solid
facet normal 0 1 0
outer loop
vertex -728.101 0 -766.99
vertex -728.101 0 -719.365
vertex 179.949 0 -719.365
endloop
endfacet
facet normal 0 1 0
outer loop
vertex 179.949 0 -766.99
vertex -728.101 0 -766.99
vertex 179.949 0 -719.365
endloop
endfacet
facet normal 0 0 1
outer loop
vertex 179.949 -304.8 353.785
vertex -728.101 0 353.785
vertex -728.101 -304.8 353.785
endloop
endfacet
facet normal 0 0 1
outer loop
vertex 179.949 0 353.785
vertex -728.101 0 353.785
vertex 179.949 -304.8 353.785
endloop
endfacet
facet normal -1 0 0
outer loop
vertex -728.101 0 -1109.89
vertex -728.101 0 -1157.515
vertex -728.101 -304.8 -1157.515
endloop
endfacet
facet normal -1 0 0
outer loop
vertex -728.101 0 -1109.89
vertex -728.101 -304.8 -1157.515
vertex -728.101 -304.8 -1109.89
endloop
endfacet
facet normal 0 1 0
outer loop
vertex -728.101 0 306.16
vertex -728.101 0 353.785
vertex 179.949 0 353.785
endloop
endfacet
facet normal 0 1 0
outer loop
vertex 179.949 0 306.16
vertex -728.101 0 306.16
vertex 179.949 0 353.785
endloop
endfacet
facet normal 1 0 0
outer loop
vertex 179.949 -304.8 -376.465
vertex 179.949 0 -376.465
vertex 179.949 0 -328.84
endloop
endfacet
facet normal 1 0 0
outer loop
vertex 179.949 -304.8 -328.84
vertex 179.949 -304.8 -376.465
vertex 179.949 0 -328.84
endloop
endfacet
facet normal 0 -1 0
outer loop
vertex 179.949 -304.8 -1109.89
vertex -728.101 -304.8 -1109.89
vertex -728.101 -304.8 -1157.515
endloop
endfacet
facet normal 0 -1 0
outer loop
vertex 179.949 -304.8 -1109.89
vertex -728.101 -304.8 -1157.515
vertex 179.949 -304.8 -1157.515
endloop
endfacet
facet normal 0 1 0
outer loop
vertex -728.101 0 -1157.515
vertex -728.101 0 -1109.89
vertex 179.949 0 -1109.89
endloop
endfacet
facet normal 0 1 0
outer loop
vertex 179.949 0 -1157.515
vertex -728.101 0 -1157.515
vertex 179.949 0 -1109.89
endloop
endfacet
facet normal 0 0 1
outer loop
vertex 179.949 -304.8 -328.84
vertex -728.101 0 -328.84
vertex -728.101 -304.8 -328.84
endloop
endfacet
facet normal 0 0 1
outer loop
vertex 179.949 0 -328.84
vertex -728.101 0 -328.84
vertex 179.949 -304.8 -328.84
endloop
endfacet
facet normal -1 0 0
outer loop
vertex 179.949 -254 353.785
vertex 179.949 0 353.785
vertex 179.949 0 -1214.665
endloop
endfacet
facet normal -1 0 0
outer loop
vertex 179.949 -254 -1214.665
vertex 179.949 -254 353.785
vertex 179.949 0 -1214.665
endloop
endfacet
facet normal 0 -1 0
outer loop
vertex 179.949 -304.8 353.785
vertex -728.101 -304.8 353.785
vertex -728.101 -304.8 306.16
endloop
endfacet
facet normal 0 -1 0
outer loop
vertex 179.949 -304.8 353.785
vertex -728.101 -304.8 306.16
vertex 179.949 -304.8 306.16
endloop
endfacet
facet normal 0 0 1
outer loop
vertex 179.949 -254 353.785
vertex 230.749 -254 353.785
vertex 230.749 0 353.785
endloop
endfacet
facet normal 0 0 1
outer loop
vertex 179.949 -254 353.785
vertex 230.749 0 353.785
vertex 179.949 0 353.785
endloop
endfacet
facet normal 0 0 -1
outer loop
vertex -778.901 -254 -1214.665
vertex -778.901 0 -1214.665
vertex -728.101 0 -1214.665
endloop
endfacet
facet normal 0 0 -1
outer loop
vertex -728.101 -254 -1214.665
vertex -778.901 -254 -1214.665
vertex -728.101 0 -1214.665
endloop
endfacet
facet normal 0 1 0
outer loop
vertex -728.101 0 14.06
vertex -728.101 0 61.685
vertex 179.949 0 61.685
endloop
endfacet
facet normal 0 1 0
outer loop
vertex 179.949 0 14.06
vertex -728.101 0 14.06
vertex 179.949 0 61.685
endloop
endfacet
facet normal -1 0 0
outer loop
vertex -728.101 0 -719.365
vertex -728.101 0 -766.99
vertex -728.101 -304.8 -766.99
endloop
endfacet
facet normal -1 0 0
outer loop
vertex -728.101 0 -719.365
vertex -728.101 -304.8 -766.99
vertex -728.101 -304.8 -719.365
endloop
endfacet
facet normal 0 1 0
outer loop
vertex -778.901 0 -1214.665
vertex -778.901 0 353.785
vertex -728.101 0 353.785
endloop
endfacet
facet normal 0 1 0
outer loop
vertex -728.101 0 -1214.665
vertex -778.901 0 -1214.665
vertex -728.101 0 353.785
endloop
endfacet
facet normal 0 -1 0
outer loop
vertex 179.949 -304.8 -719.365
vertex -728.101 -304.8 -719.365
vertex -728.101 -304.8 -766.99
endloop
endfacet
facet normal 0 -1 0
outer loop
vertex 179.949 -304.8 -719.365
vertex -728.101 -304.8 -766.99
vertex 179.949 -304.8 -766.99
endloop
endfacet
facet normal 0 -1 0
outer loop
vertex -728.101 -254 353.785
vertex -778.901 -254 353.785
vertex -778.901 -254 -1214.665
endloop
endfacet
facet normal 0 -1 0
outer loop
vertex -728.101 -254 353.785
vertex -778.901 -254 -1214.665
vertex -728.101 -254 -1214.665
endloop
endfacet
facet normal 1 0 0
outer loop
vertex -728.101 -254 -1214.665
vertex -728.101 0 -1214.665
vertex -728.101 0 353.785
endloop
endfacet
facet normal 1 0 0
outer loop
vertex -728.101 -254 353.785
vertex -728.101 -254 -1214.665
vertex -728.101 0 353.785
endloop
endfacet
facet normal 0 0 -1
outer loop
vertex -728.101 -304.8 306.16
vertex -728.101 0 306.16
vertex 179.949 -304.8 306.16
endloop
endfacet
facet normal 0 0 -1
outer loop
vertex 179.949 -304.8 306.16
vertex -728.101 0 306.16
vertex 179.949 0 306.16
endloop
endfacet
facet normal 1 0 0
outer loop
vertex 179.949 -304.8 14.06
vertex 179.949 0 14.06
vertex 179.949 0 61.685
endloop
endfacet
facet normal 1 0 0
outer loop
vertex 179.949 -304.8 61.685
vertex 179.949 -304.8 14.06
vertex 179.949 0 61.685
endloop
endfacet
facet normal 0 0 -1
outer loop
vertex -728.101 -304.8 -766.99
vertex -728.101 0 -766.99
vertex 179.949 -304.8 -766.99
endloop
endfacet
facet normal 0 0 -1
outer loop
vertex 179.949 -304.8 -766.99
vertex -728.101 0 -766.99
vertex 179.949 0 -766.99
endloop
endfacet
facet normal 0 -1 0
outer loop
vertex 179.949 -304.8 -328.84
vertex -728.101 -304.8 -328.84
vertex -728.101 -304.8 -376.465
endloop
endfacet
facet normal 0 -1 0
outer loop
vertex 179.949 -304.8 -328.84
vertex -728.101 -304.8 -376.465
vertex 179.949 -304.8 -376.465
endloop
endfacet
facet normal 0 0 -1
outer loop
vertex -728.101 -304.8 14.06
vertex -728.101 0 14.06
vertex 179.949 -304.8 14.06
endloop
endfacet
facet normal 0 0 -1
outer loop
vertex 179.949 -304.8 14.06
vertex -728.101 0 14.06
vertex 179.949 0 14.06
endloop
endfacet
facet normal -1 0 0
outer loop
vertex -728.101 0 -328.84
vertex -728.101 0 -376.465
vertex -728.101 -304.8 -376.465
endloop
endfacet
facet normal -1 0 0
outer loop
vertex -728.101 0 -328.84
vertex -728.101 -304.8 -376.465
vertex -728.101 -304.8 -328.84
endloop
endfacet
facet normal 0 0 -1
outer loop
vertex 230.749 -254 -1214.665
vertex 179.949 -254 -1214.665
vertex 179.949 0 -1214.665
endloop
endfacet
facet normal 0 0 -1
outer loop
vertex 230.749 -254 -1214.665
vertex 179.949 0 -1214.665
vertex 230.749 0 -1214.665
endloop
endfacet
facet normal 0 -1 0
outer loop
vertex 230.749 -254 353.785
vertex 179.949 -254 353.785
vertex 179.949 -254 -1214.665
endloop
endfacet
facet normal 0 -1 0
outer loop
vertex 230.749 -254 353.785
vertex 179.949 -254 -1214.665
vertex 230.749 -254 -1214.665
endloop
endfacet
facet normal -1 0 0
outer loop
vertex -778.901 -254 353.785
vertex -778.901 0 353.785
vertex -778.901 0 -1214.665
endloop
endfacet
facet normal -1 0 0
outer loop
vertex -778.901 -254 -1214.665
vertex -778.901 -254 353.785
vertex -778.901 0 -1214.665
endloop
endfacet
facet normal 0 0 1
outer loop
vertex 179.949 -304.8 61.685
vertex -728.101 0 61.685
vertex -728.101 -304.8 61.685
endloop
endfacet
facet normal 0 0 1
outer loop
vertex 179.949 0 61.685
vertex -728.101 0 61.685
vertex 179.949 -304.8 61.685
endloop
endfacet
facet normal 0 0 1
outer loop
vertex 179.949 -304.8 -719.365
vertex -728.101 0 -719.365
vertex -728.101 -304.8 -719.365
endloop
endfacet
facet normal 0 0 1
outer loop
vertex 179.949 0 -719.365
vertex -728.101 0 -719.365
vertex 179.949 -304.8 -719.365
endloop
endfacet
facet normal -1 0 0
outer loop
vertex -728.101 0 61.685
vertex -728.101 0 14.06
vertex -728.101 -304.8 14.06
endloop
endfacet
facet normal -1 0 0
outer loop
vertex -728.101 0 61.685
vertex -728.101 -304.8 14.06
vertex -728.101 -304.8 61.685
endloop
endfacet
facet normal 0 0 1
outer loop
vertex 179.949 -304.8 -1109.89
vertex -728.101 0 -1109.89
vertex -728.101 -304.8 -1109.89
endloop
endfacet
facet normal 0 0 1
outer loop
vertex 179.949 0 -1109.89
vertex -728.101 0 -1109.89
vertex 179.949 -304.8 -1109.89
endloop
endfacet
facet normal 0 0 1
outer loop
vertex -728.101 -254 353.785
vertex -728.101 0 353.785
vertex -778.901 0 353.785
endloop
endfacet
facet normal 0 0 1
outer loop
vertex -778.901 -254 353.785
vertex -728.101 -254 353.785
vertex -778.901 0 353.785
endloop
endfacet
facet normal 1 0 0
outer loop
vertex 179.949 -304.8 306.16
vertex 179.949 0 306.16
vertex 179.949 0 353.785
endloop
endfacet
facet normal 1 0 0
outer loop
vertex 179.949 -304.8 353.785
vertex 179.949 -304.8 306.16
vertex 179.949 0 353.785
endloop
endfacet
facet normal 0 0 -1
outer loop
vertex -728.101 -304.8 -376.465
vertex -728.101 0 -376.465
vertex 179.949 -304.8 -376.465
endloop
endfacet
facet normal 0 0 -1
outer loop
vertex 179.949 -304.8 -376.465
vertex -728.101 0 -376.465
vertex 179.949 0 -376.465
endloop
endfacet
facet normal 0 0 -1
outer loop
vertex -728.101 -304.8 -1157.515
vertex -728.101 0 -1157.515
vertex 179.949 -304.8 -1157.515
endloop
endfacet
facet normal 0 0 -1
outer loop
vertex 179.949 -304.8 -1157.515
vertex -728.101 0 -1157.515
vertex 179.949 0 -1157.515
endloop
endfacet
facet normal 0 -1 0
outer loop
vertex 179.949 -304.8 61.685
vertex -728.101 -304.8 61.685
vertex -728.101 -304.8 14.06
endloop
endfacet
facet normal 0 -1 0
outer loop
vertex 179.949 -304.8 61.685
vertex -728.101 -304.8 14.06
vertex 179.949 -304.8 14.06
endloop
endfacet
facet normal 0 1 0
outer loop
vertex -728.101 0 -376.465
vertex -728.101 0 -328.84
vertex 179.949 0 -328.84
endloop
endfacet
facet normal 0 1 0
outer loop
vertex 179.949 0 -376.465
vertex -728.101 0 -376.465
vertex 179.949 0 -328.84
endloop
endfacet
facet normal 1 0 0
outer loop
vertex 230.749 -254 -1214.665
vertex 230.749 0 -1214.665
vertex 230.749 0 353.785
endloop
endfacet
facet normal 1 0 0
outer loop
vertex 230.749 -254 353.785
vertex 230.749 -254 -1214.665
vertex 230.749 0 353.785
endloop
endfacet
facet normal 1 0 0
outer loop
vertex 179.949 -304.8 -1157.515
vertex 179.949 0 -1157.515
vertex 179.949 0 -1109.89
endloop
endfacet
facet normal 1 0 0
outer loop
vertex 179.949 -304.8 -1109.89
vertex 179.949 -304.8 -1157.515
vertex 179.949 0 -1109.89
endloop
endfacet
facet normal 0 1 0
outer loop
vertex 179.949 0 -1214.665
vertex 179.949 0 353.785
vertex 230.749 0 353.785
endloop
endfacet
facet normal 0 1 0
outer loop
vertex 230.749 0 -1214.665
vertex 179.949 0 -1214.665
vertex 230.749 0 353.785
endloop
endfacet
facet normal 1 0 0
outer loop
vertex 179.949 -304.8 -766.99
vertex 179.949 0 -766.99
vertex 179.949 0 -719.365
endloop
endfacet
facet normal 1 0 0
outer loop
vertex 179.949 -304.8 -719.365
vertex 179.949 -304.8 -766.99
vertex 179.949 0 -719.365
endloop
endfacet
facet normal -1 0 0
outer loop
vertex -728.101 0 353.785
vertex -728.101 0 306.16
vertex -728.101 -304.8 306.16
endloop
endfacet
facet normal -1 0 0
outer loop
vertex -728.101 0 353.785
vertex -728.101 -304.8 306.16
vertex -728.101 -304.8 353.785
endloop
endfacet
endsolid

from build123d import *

# Parameters (mm, degrees)
F1_DEPTH = 254
F0_W     = 908.05
F0_H     = 47.625
F2_DEPTH = 304.8


with BuildPart() as f1:
    # F0 (on Front) → F1 (new body)
    with BuildSketch(Plane.XZ):
        Polygon((-728.100508, 353.784593), (-778.900508, 353.784593), (-778.900508, -1214.665407), (-728.100508, -1214.665407), (-728.100508, -1157.515407), (-728.100508, -1109.890407), (-728.100508, -766.990407), (-728.100508, -719.365407), (-728.100508, -376.465407), (-728.100508, -328.840407), (-728.100508, 14.059593), (-728.100508, 61.684593), (-728.100508, 306.159593), align=None)
        Polygon((230.749492, 353.784593), (179.949492, 353.784593), (179.949492, 306.159593), (179.949492, 61.684593), (179.949492, 14.059593), (179.949492, -328.840407), (179.949492, -376.465407), (179.949492, -719.365407), (179.949492, -766.990407), (179.949492, -1109.890407), (179.949492, -1157.515407), (179.949492, -1214.665407), (230.749492, -1214.665407), align=None)
    extrude(amount=F1_DEPTH)


with BuildPart() as f2:
    # F0 (on Front) → F2 (new body)
    with BuildSketch(Plane.XZ):
        with Locations((-274.075508, 329.972093)):
            Rectangle(F0_W, F0_H)
        with Locations((-274.075508, 37.872093)):
            Rectangle(F0_W, F0_H)
        with Locations((-274.075508, -352.652907)):
            Rectangle(F0_W, F0_H)
        with Locations((-274.075508, -743.177907)):
            Rectangle(F0_W, F0_H)
        with Locations((-274.075508, -1133.702907)):
            Rectangle(F0_W, F0_H)
    extrude(amount=F2_DEPTH)


solid = Compound([f1.part, f2.part])
